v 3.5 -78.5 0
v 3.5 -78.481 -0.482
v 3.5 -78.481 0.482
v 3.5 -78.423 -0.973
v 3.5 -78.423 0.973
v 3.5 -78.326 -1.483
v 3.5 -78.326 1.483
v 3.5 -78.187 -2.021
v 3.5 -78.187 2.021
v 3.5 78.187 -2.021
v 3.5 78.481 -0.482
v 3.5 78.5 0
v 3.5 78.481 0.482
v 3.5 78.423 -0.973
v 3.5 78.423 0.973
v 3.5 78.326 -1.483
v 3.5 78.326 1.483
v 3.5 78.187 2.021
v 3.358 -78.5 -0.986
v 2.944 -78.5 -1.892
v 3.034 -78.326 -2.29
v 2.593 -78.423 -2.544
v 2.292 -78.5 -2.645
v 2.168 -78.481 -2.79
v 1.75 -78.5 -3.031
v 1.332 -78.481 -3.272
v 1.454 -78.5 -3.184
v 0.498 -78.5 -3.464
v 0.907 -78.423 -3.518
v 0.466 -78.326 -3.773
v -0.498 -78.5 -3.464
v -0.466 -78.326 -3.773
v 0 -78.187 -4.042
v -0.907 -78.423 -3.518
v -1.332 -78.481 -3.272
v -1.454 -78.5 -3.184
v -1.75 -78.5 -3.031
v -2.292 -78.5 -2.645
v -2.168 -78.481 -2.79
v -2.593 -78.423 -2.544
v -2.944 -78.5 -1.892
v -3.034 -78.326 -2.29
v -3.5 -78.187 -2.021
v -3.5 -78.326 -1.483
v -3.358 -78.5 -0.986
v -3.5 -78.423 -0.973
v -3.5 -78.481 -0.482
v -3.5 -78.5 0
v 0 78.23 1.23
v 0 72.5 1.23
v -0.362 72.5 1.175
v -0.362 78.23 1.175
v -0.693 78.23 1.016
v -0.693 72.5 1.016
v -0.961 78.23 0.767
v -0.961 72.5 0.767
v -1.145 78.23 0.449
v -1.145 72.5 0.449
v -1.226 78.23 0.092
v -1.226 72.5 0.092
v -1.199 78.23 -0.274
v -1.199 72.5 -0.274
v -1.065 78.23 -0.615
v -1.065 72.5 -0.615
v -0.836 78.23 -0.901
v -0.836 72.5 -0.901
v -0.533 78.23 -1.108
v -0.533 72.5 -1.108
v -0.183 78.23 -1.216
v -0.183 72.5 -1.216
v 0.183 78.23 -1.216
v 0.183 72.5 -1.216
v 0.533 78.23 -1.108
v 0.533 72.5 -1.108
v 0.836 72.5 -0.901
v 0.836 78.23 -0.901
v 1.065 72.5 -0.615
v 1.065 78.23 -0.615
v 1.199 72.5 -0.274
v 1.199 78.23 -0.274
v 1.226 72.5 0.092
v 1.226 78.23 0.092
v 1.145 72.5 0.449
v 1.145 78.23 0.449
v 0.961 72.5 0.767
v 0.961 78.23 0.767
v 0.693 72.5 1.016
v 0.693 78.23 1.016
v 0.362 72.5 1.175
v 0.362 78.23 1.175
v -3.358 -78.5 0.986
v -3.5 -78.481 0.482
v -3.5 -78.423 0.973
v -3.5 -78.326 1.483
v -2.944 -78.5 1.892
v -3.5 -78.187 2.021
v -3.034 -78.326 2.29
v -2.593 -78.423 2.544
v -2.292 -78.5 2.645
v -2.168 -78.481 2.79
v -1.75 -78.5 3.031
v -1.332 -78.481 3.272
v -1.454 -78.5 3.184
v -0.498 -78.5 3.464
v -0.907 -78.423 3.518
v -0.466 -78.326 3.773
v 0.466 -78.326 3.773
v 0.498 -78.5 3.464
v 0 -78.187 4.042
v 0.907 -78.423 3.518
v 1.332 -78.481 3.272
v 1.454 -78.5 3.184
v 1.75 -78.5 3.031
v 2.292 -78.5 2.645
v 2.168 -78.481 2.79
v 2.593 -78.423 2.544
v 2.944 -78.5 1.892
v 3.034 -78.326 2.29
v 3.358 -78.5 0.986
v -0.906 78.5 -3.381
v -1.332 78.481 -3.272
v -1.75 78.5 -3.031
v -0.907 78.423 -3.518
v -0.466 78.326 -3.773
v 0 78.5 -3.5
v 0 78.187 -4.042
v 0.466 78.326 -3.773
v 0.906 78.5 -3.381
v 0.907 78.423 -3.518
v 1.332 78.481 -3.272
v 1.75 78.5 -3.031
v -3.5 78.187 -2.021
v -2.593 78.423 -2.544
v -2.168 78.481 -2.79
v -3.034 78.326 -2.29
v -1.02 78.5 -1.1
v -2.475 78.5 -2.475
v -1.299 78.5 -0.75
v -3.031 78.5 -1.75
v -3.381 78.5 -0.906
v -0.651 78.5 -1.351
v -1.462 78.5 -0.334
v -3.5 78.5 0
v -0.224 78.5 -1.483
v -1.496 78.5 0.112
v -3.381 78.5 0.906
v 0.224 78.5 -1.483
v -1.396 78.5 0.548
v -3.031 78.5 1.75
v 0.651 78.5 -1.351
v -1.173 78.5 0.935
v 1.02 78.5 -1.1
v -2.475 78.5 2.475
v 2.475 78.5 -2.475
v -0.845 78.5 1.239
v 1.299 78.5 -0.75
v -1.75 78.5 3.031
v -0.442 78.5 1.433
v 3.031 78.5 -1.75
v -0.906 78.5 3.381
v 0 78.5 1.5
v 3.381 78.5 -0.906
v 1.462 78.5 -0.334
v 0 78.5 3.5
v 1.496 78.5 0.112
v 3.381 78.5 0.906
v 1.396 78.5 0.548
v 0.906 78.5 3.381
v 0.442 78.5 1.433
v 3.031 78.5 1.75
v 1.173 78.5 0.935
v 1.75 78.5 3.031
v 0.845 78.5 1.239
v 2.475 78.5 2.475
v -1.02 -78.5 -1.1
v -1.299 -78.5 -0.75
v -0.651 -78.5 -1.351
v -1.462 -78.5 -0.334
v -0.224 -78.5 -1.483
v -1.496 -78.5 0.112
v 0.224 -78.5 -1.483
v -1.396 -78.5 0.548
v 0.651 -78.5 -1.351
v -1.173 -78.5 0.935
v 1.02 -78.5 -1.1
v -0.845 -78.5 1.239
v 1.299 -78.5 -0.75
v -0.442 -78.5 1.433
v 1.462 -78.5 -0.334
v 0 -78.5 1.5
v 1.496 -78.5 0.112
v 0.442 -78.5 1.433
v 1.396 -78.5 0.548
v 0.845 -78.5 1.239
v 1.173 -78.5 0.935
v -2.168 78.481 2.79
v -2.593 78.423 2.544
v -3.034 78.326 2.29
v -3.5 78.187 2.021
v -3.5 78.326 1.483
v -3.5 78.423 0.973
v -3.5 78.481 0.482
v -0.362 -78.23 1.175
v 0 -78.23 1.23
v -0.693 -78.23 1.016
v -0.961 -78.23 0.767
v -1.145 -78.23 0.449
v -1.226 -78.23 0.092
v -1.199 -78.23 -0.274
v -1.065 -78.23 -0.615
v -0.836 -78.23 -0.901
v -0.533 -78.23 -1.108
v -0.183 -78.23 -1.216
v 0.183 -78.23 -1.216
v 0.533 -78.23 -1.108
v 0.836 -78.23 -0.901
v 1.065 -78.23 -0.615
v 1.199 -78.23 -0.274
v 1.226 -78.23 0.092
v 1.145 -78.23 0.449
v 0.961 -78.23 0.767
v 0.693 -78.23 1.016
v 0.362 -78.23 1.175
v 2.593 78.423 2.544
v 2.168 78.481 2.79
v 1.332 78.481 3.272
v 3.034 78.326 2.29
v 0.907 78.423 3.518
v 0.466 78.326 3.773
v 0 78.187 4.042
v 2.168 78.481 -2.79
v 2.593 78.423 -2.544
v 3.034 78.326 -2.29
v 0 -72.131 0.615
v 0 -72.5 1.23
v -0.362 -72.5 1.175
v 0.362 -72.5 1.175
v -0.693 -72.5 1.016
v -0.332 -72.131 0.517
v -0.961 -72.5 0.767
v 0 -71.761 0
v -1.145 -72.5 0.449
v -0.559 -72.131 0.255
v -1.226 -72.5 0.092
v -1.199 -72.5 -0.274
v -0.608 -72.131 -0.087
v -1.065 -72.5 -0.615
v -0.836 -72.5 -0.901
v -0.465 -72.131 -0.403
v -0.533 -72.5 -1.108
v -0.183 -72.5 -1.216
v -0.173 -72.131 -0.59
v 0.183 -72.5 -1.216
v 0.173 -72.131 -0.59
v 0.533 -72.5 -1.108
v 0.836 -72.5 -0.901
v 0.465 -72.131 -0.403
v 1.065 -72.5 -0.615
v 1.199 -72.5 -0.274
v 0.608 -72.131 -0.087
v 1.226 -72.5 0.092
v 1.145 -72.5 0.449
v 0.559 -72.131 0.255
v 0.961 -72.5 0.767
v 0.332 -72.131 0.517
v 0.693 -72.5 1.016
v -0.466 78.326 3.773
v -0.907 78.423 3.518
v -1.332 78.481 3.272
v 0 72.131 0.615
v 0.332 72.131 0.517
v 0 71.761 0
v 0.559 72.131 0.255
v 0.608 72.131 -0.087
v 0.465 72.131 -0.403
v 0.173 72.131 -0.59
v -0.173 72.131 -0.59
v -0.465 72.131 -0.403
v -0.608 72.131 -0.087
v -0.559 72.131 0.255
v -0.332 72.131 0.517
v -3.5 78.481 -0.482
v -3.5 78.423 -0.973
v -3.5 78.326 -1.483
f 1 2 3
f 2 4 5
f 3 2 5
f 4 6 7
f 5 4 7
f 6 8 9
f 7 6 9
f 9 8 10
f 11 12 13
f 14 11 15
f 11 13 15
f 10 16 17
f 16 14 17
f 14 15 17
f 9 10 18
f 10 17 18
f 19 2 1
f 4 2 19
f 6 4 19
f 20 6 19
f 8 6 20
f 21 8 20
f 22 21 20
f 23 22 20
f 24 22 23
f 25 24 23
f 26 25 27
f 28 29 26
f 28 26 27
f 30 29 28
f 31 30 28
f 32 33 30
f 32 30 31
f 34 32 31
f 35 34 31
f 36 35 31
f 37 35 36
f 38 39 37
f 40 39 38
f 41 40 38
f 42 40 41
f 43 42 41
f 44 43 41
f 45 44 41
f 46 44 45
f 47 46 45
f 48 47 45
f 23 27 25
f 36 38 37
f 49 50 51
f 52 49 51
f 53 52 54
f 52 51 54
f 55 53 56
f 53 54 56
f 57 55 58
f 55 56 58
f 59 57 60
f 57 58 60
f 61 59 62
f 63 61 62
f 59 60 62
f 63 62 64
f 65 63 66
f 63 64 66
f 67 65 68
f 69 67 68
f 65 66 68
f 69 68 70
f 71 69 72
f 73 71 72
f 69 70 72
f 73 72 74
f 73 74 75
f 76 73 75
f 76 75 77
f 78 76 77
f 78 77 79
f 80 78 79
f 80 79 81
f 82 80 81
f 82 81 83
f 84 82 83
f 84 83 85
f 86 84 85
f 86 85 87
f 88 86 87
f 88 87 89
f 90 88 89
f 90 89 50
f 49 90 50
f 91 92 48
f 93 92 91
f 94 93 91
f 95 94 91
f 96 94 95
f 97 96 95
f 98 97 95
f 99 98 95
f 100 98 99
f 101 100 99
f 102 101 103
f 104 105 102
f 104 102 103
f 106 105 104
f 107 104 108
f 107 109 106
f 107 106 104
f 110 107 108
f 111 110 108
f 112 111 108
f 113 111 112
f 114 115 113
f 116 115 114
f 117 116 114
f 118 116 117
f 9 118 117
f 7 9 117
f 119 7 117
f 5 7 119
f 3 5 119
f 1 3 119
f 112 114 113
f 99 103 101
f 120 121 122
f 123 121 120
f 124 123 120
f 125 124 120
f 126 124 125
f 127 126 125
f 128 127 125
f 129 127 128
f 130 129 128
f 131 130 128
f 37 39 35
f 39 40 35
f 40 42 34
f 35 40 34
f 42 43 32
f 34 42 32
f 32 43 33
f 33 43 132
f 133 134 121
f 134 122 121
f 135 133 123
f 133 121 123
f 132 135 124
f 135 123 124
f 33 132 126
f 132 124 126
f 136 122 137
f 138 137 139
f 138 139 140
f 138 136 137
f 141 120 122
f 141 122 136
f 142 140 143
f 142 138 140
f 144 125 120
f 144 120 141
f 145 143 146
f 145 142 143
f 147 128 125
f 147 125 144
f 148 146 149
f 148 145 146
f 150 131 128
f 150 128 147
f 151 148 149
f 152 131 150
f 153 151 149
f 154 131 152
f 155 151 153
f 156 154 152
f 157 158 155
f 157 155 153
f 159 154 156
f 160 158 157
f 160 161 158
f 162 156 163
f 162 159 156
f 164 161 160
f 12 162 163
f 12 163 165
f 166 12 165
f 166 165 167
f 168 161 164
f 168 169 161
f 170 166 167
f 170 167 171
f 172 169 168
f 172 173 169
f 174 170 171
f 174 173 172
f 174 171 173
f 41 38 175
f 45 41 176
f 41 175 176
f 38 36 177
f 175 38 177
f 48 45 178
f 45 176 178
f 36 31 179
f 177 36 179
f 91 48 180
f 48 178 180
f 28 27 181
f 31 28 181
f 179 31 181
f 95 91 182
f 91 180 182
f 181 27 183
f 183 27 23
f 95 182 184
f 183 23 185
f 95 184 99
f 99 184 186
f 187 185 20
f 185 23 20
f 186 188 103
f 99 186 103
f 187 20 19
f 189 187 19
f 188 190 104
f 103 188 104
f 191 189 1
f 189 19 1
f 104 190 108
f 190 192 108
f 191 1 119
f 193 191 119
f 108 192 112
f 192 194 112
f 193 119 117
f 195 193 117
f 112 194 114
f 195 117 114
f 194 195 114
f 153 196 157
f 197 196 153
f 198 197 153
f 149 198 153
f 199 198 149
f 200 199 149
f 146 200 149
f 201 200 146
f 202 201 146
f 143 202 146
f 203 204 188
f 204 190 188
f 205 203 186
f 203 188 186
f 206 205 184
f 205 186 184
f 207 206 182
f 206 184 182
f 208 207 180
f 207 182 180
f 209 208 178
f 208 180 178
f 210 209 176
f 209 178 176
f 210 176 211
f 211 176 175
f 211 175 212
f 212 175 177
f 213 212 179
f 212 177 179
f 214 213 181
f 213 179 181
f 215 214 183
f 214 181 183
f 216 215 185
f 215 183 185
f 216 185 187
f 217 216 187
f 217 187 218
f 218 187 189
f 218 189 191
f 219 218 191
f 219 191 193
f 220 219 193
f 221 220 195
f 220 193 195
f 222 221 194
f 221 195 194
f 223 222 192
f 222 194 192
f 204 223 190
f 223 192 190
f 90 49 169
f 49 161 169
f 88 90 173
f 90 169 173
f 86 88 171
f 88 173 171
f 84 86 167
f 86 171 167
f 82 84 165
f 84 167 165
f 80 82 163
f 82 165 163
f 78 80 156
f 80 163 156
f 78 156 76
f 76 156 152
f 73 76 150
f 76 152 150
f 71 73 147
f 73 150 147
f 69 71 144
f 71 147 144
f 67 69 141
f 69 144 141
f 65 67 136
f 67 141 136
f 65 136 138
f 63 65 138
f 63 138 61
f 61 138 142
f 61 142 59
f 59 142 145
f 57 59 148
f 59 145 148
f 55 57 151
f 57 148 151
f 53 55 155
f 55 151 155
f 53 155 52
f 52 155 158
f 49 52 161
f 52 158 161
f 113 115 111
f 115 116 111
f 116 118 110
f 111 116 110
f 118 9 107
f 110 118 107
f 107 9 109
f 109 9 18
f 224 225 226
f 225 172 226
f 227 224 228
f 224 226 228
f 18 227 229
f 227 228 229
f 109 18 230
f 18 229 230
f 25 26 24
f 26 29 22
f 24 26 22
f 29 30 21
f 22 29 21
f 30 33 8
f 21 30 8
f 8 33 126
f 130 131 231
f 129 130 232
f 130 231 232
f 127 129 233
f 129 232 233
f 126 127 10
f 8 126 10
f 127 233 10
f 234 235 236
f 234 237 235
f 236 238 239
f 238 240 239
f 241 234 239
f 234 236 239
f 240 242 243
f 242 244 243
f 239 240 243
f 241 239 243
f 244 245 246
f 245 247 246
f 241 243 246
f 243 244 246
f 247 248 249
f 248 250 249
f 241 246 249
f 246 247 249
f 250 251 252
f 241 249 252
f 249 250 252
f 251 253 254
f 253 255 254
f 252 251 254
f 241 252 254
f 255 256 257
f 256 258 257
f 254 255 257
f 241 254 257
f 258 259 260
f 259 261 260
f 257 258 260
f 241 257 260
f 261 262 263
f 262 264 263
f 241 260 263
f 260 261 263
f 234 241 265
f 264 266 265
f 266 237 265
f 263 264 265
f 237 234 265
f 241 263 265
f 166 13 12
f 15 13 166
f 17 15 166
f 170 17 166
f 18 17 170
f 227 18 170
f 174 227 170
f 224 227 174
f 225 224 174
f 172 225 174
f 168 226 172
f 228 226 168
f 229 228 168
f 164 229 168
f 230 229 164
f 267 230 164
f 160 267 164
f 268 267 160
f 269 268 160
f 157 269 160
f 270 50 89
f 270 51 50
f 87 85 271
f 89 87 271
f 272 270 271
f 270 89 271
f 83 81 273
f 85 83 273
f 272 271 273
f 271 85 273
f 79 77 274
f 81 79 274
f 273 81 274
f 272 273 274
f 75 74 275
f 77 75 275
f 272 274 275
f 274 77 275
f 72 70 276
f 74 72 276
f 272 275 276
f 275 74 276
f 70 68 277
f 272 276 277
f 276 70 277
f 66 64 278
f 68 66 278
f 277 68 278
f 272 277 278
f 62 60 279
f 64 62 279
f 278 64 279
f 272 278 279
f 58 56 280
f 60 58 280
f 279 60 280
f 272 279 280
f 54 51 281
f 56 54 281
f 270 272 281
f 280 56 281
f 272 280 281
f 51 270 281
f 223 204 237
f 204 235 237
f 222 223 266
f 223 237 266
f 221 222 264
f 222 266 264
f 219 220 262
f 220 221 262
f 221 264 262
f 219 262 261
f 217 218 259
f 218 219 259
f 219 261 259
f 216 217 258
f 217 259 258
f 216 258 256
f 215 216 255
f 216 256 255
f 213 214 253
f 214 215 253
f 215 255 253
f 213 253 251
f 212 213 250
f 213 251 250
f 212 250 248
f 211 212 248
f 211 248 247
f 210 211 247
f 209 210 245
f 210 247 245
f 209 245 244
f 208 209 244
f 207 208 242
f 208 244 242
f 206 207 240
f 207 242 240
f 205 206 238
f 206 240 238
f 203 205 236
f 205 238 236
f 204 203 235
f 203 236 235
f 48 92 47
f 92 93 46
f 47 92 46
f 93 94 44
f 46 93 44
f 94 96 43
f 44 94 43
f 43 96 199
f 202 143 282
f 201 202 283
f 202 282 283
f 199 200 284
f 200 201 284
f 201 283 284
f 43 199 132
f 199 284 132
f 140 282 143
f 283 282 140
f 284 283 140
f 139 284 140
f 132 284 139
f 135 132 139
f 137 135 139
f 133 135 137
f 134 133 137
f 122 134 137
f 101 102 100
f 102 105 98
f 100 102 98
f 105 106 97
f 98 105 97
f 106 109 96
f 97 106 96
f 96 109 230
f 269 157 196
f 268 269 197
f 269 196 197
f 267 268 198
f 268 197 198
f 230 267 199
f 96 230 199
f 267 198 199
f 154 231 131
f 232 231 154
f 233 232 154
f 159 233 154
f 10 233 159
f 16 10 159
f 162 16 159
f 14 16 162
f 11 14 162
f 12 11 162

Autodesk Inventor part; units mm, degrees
ref_plane "YZ Plane" through (0, 0, 0) normal (1, 0, 0) x (0, 1, 0)
ref_plane "XZ Plane" through (0, 0, 0) normal (0, 1, 0) x (-1, 0, 0)
ref_plane "XY Plane" through (0, 0, 0) normal (0, 0, 1) x (1, 0, 0)
sketch "スケッチ1" plane through (0, 0, 0) normal (1, 0, 0) x (0, 1, 0)
  line L0 (-78.5, 0) -> (78.5, 0)
  line L1 (0, 0) -> (0, 4.0415) construction
  line L2 (-78.1874, 4.0415) -> (-78.5, 3.5)
  line L3 (-78.5, 3.5) -> (-78.5, 0)
  line L4 (-78.1874, 4.0415) -> (78.1874, 4.0415)
  line L5 (78.1874, 4.0415) -> (78.5, 3.5)
  line L6 (78.5, 3.5) -> (78.5, 0)
  dimension "d1" = 3.5
  dimension "d2" = 4.0415
  dimension "d3" = 30
  dimension "d4" = 157
revolve "回転1" add sketch "スケッチ1" angle 360 about axis through (0, -78.5, 0) along (0, 1, 0)
sketch "スケッチ2" plane through (0, 78.5, 0) normal (0, 1, 0) x (1, 0, 0)
  circle A0 centre (0, 0) radius 4.0415 projected
  line L0 (0, -4.0415) -> (-3.5, -2.0207)
  line L1 (-3.5, -2.0207) -> (-3.5, 2.0207)
  line L2 (-3.5, 2.0207) -> (0, 4.0415)
  line L3 (0, 4.0415) -> (3.5, 2.0207)
  line L4 (3.5, 2.0207) -> (3.5, -2.0207)
  line L5 (3.5, -2.0207) -> (0, -4.0415)
  point P0 (0, 0)
  point P1 (0, 0)
  point P2 (3.5, -2.0207)
  point P3 (3.5, 2.0207)
  point P4 (3.5, 2.0207)
  point P5 (0, 4.0415)
  point P6 (0, 4.0415)
  point P7 (-3.5, 2.0207)
  point P8 (-3.5, 2.0207)
  point P9 (-3.5, -2.0207)
  point P10 (-3.5, -2.0207)
  point P11 (0, 0)
extrude "押し出し1" cut sketch "スケッチ2" against normal through all contours A0 L4 | L3 A0 | A0 L5 | L2 A0 | A0 L0 | L1 A0
hole "穴1" at (0, 78.5, 0) direction (0, -1, 0) diameter 2.459 depth 6 tip angle 118 countersink diameter 3 countersink angle 90 thread size "M3x0.5" class "6H" standard "ISO Metric profile"
mirror "ミラー1" about plane through (0, 0, 0) normal (0, 1, 0) of "穴1"
equation "\"d2\" = 1.1547 * d1"
properties part number "SLSBF7-157-M3-N3" material "ステンレス鋼 AISI 304"
